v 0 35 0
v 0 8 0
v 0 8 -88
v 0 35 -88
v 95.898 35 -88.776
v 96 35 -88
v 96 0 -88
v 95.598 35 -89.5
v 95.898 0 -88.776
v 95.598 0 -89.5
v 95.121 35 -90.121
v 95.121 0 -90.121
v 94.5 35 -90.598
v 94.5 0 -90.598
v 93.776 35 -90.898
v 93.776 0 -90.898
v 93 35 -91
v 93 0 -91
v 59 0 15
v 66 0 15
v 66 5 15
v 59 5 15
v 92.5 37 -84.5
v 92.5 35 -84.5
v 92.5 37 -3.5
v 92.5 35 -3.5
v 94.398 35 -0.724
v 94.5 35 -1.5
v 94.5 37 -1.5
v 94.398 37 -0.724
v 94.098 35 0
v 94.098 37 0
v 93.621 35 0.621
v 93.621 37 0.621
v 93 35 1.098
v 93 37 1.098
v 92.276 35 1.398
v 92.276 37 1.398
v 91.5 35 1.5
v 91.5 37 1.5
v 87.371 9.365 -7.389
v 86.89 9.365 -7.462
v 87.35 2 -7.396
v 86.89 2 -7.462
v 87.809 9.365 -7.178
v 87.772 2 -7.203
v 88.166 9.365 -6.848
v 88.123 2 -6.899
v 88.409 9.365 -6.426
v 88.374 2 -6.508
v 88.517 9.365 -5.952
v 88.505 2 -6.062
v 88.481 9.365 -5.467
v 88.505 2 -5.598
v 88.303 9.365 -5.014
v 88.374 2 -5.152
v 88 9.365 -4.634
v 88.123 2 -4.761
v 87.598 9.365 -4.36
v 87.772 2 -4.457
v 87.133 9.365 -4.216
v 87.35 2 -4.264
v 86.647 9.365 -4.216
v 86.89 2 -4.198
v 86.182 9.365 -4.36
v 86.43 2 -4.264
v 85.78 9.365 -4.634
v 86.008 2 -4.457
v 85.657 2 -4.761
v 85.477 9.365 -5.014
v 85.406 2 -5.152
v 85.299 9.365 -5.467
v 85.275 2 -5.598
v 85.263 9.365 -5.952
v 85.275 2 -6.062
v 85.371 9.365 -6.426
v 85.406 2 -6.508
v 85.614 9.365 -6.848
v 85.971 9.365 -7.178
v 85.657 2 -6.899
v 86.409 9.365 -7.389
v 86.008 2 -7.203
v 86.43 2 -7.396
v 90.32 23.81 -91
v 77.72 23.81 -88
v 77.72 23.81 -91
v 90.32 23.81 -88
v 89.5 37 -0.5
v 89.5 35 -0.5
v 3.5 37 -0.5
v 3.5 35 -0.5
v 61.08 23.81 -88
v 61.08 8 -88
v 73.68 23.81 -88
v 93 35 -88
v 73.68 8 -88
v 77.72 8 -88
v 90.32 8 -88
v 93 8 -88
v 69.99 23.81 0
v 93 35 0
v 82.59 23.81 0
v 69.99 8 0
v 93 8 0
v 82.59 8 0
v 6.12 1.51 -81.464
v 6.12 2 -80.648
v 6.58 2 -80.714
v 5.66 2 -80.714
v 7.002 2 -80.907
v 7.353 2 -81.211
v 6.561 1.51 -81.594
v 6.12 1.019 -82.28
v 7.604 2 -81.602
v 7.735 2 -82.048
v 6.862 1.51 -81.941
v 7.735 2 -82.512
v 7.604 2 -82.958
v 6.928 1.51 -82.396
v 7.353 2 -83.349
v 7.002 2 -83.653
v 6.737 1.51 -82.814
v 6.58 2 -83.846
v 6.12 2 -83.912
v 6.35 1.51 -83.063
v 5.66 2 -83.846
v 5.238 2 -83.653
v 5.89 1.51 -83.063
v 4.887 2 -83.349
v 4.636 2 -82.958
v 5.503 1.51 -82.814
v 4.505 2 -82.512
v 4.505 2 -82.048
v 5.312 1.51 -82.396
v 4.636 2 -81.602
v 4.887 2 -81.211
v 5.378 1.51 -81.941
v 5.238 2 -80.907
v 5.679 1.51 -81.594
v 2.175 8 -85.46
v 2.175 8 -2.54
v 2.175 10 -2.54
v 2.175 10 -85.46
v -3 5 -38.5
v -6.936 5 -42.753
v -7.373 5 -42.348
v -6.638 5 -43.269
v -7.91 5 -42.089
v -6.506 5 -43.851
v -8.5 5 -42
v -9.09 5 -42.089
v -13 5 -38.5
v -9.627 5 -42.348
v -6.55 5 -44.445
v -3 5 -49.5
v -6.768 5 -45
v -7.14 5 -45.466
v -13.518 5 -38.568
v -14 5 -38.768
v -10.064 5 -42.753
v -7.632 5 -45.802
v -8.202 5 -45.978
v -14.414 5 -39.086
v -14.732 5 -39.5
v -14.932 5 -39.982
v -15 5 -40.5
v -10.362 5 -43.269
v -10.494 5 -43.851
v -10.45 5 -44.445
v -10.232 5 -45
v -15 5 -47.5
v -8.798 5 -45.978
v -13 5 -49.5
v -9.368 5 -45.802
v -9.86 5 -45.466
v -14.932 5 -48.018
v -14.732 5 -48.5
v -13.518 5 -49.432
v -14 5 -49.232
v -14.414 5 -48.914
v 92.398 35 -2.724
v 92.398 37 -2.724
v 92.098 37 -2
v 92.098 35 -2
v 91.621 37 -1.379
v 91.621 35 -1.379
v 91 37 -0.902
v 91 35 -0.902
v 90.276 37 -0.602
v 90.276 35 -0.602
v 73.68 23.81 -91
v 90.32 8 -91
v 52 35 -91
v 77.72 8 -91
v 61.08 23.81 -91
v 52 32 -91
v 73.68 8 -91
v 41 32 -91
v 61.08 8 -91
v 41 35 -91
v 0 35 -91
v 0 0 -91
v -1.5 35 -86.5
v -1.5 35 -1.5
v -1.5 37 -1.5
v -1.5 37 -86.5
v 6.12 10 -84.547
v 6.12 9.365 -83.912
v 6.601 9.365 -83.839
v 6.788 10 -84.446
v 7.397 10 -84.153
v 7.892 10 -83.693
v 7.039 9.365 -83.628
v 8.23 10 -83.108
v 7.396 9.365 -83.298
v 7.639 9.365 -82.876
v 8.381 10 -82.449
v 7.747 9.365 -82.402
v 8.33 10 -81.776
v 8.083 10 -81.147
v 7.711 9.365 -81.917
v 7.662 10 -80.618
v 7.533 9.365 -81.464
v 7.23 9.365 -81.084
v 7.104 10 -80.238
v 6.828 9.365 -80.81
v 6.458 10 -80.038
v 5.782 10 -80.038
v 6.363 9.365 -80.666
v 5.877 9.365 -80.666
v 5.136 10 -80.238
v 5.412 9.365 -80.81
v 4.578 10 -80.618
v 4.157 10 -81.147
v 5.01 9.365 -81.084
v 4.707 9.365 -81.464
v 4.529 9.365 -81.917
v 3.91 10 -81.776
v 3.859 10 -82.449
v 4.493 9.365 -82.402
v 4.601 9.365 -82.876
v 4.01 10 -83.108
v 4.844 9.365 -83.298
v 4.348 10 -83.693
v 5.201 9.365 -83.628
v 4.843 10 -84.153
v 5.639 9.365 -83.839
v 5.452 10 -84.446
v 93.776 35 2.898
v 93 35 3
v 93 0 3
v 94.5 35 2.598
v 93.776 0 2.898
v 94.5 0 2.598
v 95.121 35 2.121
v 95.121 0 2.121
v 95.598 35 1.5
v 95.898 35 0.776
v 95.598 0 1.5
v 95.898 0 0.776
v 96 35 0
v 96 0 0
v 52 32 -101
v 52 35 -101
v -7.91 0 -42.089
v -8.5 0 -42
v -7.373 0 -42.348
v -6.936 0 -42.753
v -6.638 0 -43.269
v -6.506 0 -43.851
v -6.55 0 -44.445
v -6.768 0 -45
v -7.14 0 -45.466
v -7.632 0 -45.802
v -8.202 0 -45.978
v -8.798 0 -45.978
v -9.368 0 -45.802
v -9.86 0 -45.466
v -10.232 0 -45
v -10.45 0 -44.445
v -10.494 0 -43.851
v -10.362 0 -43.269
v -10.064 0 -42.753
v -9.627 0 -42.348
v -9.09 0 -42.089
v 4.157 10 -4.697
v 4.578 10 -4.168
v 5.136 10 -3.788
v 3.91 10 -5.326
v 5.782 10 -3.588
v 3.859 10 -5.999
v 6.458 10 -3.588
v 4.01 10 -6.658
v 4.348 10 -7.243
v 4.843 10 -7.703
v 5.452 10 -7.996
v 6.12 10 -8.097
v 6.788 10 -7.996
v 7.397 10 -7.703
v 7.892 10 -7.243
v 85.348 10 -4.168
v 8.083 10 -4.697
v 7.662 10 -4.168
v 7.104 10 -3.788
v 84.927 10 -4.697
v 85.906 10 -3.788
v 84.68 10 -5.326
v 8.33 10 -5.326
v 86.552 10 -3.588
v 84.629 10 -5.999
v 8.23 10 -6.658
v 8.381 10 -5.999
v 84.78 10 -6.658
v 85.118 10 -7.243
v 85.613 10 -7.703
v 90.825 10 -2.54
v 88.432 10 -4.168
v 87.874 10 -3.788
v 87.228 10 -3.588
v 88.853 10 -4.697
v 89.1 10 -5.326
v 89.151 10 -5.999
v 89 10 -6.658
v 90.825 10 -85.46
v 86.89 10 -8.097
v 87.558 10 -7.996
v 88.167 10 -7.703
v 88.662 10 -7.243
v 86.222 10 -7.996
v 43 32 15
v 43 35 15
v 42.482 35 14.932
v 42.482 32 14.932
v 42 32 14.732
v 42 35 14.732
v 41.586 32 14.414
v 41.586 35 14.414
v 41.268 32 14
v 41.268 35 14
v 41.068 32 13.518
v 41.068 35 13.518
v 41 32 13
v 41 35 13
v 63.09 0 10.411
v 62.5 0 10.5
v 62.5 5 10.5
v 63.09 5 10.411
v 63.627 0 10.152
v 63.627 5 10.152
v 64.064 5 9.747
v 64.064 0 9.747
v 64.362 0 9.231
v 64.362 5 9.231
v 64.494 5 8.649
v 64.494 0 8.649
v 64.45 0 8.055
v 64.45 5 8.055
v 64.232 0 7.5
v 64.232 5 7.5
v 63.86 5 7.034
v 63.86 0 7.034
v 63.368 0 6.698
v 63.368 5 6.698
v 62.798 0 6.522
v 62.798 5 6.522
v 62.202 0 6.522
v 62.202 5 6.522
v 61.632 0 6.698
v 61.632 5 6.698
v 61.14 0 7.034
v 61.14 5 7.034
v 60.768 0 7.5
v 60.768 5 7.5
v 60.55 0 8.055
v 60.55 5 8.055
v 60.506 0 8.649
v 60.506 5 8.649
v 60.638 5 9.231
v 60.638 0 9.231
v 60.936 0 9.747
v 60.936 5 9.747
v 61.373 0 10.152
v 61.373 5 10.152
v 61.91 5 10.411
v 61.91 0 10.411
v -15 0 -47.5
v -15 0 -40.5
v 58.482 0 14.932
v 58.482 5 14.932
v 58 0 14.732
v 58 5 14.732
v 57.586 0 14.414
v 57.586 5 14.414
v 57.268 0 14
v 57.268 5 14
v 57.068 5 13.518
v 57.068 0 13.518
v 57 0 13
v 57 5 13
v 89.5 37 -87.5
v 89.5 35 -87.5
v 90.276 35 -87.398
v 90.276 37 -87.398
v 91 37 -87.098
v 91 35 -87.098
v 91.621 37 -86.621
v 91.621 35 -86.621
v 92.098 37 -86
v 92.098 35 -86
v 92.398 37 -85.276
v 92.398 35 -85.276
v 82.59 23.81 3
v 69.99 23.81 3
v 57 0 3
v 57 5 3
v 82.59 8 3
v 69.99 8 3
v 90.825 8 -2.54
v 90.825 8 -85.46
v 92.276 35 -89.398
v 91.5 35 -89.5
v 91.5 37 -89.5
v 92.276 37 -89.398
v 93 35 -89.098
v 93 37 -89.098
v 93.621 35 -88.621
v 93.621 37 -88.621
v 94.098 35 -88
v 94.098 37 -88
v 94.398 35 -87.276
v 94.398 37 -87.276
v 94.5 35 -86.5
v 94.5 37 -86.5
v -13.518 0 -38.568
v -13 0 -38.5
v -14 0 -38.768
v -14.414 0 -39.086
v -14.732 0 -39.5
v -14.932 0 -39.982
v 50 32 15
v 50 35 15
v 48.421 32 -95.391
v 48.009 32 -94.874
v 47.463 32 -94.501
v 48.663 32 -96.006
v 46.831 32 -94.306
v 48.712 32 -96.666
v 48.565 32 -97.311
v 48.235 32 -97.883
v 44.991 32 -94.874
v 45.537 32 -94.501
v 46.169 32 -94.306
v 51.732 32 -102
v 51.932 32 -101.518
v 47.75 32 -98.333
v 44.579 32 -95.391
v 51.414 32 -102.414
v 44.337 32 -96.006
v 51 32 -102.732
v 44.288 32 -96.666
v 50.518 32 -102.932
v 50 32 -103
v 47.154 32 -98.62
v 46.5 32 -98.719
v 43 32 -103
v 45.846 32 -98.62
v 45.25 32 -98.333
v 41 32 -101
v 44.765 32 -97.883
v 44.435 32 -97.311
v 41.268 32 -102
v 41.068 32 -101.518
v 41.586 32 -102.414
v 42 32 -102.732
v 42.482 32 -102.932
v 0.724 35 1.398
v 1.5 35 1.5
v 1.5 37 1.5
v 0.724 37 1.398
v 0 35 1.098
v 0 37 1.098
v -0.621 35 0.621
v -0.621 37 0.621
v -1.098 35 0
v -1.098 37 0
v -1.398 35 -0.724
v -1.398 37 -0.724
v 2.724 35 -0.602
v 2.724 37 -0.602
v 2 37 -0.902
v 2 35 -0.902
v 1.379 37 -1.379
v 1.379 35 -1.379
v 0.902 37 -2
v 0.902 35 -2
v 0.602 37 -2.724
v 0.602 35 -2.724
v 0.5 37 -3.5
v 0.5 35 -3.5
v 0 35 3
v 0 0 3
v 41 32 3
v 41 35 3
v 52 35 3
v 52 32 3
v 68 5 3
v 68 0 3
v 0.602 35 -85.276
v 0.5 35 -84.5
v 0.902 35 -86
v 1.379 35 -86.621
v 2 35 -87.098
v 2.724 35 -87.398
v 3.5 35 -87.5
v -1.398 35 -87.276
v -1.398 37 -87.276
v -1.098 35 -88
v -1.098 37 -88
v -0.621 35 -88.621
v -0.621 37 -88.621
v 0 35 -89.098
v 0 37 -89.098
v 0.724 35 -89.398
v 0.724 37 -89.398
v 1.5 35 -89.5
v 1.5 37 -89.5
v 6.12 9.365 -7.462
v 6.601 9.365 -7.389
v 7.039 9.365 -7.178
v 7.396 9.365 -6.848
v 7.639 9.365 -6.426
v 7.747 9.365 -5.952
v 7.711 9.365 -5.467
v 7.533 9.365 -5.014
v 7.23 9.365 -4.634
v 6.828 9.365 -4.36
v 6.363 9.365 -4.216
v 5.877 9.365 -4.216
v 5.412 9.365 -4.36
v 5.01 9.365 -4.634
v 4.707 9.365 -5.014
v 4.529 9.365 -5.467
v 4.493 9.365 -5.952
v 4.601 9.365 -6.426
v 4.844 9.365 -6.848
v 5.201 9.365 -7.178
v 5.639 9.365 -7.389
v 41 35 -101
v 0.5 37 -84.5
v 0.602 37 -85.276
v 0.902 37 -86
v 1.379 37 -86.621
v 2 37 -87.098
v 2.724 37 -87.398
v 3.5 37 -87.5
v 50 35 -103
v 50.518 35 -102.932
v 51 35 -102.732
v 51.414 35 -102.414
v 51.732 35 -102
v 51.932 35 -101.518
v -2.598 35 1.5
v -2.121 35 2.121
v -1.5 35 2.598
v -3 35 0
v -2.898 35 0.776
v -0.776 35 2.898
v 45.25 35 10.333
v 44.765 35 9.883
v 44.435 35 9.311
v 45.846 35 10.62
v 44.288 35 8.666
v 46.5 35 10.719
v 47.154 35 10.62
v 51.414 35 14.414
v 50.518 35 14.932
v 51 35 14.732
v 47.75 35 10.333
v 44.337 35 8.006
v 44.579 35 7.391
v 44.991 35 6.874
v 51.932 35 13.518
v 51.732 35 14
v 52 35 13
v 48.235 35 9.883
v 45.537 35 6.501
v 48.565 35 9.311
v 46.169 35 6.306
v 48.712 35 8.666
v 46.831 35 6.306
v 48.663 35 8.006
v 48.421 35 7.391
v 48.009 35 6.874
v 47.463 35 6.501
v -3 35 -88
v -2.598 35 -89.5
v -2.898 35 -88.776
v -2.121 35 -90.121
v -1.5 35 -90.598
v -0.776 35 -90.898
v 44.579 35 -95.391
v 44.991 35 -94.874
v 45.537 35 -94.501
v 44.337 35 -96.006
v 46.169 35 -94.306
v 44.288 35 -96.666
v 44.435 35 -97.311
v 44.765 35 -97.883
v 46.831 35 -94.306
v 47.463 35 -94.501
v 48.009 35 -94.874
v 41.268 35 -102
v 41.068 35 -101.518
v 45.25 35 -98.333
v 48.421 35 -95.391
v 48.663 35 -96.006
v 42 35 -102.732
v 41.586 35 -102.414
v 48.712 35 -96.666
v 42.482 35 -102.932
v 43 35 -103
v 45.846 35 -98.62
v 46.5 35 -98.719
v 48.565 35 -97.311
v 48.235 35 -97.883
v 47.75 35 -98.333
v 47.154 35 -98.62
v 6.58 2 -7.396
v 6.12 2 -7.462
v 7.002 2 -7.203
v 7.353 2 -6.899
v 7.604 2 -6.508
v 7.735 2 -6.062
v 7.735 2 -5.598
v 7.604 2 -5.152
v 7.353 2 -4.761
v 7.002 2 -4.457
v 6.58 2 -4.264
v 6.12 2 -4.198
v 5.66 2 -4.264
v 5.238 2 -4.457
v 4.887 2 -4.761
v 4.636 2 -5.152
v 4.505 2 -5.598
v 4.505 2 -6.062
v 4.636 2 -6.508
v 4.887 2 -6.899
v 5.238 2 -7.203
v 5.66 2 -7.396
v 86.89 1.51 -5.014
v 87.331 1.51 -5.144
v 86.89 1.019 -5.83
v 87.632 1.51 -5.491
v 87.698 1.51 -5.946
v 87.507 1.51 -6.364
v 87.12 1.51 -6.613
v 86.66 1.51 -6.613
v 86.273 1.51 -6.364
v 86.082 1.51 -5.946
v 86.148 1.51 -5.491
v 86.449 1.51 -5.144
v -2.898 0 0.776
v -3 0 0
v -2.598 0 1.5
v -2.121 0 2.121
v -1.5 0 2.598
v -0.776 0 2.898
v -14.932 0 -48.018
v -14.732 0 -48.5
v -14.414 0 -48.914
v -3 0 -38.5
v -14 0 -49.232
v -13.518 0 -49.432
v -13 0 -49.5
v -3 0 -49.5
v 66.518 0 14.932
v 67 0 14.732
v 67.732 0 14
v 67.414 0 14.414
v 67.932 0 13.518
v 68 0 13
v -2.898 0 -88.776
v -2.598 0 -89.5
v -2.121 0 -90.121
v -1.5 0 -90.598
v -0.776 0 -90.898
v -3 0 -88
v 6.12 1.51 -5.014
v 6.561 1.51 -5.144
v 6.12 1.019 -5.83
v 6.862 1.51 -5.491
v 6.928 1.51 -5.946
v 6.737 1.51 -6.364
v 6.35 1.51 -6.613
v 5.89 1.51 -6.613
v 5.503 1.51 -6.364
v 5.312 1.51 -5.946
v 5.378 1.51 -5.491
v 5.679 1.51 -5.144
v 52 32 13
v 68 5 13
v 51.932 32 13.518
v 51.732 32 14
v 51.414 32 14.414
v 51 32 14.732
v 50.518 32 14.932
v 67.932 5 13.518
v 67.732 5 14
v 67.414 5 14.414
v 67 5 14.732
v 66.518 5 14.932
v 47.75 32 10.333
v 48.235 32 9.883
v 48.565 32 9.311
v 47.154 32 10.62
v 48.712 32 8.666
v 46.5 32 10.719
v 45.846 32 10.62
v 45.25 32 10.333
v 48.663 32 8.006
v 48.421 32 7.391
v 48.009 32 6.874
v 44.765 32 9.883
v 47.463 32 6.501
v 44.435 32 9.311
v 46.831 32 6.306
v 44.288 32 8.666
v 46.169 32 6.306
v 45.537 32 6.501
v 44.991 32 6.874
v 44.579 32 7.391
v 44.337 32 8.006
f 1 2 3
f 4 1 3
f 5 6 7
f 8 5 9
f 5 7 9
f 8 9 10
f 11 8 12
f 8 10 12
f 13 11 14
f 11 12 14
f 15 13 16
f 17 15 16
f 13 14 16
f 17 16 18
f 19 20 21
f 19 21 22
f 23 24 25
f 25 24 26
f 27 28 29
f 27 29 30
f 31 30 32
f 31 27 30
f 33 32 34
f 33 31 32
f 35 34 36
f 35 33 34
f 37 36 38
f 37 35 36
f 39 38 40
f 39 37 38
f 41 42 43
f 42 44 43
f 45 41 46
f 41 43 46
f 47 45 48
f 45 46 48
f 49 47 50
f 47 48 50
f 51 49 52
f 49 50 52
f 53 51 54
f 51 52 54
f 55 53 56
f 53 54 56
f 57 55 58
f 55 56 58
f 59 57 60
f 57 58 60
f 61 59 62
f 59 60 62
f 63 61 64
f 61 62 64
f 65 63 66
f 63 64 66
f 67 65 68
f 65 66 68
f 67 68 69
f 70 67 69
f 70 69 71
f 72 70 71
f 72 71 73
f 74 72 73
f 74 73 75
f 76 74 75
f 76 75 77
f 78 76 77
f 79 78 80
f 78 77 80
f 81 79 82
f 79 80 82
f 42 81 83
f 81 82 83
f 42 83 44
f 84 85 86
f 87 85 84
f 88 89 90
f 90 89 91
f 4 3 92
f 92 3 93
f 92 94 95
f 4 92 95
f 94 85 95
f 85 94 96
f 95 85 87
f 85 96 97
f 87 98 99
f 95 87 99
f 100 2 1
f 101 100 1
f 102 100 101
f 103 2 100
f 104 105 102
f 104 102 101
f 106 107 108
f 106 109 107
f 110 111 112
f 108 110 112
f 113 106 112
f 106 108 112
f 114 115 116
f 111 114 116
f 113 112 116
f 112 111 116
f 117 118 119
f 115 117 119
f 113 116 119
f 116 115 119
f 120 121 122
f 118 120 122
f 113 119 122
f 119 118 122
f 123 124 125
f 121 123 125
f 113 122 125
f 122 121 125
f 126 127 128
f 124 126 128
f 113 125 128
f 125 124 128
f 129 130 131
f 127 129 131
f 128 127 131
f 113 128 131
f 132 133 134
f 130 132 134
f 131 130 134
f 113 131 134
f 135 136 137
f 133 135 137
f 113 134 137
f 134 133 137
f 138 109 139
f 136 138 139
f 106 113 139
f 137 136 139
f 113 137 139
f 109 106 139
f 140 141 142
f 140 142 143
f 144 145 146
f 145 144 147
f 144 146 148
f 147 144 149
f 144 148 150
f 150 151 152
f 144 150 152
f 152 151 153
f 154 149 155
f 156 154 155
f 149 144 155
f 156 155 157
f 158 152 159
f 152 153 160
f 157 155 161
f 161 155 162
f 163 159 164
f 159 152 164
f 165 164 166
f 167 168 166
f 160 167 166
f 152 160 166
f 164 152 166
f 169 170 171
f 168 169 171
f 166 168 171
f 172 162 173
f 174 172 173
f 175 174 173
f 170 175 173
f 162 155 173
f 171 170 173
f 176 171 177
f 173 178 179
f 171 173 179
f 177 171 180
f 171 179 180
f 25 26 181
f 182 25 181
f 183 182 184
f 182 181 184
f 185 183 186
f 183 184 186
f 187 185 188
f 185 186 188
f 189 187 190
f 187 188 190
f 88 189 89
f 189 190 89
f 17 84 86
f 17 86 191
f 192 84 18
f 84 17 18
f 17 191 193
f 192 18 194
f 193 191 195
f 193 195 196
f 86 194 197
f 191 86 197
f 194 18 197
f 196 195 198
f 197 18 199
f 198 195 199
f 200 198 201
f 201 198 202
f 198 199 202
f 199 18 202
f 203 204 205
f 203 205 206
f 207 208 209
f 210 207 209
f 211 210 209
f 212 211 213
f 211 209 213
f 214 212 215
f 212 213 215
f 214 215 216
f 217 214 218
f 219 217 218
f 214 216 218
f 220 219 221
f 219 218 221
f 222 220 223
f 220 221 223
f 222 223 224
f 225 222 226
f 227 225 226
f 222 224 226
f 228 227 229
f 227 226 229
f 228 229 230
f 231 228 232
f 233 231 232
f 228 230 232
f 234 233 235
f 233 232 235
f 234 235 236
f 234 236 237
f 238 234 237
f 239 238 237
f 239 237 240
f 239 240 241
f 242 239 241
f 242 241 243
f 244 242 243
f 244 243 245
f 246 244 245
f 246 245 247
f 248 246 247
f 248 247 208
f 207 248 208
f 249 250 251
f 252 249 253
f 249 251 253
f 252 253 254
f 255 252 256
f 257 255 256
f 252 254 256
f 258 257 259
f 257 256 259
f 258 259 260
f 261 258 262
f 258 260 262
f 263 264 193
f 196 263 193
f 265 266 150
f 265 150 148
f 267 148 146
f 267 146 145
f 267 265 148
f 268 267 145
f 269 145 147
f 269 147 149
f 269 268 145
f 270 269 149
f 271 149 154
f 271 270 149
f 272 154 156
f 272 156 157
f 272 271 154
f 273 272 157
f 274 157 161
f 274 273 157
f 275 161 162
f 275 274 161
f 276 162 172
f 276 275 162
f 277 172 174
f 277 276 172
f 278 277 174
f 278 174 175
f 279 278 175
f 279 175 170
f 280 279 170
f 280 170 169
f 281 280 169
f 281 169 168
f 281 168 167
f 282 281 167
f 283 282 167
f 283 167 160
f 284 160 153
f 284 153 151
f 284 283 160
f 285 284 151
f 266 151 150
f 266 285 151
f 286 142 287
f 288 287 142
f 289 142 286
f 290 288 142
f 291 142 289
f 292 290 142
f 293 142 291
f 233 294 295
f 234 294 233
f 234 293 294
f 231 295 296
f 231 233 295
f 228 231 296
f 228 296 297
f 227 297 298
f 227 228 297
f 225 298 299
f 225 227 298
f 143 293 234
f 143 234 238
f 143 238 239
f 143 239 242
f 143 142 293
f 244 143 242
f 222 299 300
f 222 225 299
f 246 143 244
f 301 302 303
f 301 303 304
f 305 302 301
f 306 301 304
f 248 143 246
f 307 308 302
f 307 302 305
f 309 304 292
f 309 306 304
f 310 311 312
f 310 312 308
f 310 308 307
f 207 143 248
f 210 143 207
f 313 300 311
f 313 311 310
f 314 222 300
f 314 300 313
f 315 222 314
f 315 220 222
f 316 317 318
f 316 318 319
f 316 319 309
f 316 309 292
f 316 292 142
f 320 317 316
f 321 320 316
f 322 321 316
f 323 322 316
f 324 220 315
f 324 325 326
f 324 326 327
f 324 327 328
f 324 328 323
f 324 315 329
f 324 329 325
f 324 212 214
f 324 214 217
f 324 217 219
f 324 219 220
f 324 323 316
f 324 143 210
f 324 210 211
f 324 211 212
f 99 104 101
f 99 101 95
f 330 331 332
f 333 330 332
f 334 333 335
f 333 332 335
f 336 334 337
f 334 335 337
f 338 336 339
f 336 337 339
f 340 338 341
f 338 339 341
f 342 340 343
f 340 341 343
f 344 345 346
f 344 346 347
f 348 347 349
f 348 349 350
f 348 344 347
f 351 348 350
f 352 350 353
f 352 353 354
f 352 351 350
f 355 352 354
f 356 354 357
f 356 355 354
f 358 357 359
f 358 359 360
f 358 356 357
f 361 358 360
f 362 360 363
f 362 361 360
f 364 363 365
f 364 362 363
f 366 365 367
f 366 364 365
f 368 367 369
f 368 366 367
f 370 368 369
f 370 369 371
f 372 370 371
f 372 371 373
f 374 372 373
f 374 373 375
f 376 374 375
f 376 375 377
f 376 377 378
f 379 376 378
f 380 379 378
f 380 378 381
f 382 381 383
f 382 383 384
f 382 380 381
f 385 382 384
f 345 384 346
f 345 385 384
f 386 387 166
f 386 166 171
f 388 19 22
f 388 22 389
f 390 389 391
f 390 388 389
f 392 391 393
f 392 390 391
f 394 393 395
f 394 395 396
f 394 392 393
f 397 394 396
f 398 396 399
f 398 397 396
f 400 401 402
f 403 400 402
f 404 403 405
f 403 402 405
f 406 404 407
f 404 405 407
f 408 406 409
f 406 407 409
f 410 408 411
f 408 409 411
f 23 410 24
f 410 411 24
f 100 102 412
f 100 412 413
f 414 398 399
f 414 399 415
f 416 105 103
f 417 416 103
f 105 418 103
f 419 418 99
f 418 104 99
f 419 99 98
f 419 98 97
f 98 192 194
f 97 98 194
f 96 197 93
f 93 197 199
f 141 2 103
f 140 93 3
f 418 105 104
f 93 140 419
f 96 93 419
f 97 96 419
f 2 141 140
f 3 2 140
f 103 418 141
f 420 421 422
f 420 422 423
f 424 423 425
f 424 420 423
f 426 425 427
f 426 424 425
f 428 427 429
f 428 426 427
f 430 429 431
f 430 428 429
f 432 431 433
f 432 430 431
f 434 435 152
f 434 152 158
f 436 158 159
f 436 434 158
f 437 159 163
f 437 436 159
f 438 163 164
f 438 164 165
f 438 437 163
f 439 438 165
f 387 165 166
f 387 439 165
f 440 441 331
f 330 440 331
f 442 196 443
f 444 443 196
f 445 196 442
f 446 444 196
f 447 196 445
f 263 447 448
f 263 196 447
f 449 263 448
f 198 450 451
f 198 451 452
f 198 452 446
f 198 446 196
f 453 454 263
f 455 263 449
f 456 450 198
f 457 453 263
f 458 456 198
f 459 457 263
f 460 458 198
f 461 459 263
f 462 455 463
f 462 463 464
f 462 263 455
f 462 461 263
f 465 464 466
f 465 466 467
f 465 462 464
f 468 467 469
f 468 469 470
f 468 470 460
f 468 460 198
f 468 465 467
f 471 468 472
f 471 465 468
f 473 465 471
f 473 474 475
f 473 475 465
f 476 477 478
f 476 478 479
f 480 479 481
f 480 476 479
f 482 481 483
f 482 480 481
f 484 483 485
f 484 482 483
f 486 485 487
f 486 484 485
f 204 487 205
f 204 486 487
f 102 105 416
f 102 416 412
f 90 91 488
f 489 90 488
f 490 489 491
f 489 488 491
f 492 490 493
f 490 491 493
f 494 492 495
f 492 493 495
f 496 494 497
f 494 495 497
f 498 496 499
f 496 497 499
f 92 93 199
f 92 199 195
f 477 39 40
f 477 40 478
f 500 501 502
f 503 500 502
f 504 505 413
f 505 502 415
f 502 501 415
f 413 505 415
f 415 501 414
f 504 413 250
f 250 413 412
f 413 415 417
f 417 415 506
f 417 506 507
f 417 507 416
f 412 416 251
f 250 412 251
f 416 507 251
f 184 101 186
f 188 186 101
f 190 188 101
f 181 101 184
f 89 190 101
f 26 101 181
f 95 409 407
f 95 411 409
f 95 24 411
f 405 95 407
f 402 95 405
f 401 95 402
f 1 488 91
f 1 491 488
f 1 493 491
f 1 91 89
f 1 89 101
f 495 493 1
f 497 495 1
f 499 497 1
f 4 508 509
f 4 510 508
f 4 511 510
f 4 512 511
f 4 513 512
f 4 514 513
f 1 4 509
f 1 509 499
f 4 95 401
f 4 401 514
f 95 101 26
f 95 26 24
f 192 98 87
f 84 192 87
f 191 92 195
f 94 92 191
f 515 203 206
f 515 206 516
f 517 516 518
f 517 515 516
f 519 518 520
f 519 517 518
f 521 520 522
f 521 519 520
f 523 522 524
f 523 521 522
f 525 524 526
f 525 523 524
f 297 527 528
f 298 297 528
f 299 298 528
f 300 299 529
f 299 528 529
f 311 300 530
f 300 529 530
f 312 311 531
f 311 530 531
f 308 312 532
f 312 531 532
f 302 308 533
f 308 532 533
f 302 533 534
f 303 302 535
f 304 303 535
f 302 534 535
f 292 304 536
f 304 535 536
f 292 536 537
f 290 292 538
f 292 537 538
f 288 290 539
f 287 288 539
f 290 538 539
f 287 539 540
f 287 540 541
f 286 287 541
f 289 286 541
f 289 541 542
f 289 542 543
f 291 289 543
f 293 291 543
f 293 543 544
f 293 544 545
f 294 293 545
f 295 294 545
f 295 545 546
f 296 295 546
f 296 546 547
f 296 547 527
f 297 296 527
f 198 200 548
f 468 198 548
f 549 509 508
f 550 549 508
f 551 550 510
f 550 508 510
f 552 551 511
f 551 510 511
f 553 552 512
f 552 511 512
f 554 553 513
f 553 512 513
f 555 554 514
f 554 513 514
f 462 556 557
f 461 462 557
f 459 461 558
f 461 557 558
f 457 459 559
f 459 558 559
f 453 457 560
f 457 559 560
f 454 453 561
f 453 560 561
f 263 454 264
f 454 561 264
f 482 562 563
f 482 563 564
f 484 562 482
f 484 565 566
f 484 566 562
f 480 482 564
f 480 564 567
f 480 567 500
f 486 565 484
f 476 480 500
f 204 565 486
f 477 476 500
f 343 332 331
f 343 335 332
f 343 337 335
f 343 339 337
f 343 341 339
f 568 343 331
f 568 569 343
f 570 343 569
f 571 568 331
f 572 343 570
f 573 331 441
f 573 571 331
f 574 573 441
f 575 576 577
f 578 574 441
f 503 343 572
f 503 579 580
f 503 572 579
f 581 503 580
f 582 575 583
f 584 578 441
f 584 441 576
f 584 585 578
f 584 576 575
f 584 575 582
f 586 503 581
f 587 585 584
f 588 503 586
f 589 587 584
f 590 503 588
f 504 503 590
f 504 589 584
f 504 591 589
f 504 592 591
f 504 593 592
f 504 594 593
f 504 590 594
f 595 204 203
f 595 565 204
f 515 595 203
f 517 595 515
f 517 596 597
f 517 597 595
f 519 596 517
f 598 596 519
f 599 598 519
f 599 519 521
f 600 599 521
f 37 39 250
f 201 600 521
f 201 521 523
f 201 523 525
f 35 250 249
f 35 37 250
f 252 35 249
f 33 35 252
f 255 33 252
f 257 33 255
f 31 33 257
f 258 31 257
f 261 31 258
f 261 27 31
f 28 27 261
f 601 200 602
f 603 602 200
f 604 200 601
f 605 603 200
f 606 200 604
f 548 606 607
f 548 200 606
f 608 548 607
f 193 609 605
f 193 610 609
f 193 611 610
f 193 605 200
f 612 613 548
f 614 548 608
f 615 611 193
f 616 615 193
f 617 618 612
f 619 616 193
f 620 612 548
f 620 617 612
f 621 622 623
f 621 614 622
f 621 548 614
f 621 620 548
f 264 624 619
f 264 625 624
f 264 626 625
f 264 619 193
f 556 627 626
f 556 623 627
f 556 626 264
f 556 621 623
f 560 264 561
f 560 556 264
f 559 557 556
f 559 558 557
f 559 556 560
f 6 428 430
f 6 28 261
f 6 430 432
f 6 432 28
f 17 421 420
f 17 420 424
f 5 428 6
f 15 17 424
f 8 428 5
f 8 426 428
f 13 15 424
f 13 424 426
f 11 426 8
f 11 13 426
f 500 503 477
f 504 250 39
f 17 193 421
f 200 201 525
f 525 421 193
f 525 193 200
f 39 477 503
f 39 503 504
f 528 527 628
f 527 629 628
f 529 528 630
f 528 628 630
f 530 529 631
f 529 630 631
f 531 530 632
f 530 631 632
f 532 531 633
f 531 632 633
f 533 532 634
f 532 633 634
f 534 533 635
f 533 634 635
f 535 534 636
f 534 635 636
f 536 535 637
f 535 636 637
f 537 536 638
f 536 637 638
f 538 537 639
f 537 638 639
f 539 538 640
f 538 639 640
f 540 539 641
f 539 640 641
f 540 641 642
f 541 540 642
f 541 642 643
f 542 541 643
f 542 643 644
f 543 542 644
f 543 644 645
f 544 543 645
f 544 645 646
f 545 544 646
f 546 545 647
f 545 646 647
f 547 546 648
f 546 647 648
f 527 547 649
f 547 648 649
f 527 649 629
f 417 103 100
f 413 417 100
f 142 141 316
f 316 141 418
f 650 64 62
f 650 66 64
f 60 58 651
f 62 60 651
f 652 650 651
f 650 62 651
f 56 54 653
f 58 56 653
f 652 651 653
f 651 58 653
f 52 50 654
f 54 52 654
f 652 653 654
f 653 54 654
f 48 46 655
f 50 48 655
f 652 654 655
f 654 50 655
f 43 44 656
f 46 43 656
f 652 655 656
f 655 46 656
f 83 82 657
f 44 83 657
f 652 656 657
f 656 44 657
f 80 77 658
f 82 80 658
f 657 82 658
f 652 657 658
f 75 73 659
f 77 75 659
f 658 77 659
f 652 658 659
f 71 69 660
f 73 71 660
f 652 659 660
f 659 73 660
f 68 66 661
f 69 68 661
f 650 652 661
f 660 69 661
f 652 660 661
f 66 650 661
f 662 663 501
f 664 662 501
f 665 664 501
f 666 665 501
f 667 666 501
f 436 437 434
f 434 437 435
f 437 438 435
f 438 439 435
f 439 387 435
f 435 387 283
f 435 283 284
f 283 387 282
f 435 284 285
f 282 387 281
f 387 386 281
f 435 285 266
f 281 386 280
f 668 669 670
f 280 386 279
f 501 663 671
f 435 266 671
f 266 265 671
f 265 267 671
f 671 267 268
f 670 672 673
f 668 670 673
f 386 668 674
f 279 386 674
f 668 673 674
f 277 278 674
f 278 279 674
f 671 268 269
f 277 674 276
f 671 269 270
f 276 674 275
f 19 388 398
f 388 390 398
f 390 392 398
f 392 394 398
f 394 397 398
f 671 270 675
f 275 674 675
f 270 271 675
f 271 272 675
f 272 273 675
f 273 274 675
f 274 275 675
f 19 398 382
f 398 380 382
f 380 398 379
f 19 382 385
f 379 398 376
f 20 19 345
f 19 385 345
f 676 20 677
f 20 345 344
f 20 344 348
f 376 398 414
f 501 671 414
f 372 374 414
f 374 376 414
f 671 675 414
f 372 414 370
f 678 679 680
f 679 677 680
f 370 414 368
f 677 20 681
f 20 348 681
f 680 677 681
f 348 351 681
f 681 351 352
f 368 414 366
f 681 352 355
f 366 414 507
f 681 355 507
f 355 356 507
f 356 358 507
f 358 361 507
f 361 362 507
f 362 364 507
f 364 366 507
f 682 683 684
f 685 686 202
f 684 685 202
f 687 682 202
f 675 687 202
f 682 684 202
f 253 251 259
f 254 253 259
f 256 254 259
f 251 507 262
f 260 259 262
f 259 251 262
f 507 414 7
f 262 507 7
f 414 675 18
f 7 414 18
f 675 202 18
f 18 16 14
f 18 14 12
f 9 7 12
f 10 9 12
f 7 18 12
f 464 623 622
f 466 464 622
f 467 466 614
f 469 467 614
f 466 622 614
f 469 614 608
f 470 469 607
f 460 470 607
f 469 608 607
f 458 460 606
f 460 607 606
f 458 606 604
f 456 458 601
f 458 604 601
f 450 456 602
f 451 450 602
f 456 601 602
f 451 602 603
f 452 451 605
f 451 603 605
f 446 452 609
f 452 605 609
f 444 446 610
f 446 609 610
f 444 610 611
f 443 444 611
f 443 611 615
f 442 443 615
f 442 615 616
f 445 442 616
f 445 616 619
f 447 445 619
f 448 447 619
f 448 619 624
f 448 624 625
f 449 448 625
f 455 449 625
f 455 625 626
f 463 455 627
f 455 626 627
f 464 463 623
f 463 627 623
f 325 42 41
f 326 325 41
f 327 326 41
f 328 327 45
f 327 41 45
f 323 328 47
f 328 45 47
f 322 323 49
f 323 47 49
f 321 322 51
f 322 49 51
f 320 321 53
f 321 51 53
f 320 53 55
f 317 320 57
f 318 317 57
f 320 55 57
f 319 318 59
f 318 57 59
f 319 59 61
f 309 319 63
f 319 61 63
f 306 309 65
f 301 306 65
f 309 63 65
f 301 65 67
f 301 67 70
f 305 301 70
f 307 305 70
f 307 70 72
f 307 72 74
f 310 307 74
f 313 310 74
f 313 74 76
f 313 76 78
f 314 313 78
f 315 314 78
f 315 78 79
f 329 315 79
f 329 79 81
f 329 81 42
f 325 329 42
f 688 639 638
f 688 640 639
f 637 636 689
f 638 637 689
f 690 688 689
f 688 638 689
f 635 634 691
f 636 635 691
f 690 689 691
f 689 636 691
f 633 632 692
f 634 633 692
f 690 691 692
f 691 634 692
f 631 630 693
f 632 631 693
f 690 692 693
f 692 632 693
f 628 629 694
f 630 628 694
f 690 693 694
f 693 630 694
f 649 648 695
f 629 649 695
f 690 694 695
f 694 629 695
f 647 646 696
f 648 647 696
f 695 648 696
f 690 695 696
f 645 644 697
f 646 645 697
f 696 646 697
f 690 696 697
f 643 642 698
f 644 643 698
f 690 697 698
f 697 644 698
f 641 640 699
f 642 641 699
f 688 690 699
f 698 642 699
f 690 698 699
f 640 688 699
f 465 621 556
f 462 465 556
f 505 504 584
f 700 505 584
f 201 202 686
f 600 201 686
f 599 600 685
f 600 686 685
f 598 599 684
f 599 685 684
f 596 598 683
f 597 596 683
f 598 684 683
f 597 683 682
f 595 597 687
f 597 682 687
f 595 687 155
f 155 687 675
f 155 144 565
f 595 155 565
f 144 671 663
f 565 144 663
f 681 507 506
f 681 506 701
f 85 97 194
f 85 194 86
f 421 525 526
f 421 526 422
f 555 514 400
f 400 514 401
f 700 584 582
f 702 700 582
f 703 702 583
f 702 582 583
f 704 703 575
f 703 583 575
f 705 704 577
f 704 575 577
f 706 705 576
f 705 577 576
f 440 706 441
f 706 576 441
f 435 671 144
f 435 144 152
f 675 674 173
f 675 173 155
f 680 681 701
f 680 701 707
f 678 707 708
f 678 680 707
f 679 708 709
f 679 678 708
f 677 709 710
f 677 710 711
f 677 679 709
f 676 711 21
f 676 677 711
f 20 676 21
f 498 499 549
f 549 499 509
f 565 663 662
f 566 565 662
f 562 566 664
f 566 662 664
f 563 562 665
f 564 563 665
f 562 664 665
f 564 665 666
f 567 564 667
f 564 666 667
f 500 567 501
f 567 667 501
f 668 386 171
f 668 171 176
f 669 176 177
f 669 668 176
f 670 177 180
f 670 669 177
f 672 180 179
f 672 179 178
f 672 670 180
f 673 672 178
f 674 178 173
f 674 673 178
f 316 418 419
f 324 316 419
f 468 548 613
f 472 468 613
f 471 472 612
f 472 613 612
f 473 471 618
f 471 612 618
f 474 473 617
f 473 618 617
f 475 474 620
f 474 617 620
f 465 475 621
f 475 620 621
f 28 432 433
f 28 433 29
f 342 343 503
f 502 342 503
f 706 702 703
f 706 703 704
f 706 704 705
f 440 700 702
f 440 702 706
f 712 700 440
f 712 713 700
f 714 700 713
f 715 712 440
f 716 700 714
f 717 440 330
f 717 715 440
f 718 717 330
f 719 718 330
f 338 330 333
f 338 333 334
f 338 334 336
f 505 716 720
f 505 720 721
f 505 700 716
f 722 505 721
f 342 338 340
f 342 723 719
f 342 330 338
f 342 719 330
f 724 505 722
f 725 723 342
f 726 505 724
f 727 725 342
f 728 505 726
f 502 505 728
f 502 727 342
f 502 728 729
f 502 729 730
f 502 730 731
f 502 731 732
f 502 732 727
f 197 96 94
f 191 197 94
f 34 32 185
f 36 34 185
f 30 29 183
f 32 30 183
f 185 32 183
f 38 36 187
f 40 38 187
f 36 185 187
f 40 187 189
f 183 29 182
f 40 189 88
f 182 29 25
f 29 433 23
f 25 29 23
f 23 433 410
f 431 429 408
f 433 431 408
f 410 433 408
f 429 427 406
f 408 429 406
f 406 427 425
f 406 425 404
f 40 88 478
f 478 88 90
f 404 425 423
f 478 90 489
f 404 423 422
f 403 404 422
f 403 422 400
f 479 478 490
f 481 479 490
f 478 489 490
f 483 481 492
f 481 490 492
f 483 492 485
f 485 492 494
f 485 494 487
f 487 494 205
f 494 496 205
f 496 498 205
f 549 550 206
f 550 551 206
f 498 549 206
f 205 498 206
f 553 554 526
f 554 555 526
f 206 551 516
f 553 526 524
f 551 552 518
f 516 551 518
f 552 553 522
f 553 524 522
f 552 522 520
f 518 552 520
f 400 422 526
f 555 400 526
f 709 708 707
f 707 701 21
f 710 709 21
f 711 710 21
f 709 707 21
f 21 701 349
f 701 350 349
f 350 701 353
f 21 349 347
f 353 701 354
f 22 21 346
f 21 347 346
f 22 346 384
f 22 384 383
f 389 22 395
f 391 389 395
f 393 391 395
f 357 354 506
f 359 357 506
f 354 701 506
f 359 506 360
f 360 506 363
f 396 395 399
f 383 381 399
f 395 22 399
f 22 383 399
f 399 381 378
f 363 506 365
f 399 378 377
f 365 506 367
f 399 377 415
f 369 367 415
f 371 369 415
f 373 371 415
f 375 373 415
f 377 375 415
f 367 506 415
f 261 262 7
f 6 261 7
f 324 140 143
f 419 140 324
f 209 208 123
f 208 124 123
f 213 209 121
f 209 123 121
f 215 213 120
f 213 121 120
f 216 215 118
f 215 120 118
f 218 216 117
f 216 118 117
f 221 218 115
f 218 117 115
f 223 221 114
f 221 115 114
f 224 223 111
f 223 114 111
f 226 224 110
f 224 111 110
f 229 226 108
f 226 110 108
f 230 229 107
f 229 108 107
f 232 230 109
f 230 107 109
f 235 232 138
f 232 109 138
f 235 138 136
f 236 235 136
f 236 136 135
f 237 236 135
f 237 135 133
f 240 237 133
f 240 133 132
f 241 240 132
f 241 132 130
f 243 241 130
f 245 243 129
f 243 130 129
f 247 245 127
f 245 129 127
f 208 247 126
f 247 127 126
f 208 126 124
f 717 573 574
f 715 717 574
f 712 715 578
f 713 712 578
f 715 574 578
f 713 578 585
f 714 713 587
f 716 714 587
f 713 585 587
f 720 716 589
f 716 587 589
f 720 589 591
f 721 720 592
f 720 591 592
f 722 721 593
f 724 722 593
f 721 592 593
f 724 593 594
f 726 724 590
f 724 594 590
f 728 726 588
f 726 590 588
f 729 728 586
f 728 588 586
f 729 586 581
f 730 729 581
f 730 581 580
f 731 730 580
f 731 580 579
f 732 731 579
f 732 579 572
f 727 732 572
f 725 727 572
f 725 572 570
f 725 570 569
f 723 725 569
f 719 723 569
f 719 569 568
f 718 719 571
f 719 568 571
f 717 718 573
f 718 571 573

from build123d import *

# Parameters (mm, degrees)
ESBO_O1_W                        = 93
ESBO_O1_H                        = 88
RESSALTO_EXTRUS_O2_DEPTH         = 35
ESBO_O1_5_W                      = 93
ESBO_O1_5_H                      = 88
RESSALTO_EXTRUS_O3_DEPTH         = 8
ESBO_O1_7_R                      = 2
RESSALTO_EXTRUS_O6_DEPTH         = 5
ESBO_O4_R                        = 2.218632056
RESSALTO_EXTRUS_O7_DEPTH         = 3
ESBO_O5_W                        = 88.65
ESBO_O5_H                        = 82.92
RESSALTO_EXTRUS_O8_DEPTH         = 2
ESBO_O7_W                        = 12.6
ESBO_O7_H                        = 15.81
CORTE_EXTRUS_O1_DEPTH            = 146.086181285
ESBO_O8_W                        = 12.6
ESBO_O8_H                        = 15.81
CORTE_EXTRUS_O2_DEPTH            = 146.086181285
FURO_COM_FOLGA_DE_41_D           = 3.2639
FURO_COM_FOLGA_DE_41_DEPTH       = 8
FURO_COM_FOLGA_DE_41_CSINK_D     = 4.5339
FURO_COM_FOLGA_DE_41_CSINK_ANGLE = 90
FURO_COM_FOLGA_DE_41_TIP         = 0.980574487
RESSALTO_EXTRUS_O10_DEPTH        = 2


with BuildPart() as part:
    # Esboço1 → Ressalto-extrusão2 (new body)
    with BuildSketch(Plane(origin=(0, 0, 0), x_dir=(1, 0, 0), z_dir=(0, 1, 0))):
        with BuildLine():
            ThreePointArc((-3, 0), (-2.121320344, -2.121320344), (0, -3))
            Line((0, -3), (57, -3))
            Line((57, -3), (68, -3))
            Line((68, -3), (93, -3))
            ThreePointArc((93, -3), (95.121320344, -2.121320344), (96, 0))
            Line((96, 0), (96, 88))
            ThreePointArc((96, 88), (95.121320344, 90.121320344), (93, 91))
            Line((93, 91), (0, 91))
            ThreePointArc((0, 91), (-2.121320344, 90.121320344), (-3, 88))
            Line((-3, 88), (-3, 49.5))
            Line((-3, 49.5), (-3, 38.5))
            Line((-3, 38.5), (-3, 0))
        make_face()
        with Locations((46.5, 44)):
            Rectangle(ESBO_O1_W, ESBO_O1_H, mode=Mode.SUBTRACT)
    extrude(amount=RESSALTO_EXTRUS_O2_DEPTH)

    # Esboço1<5> → Ressalto-extrusão3 (add)
    with BuildSketch(Plane(origin=(0, 0, 0), x_dir=(1, 0, 0), z_dir=(0, 1, 0))):
        with Locations((46.5, 44)):
            Rectangle(ESBO_O1_5_W, ESBO_O1_5_H)
    extrude(amount=RESSALTO_EXTRUS_O3_DEPTH)

    # Esboço1<7> → Ressalto-extrusão6 (add)
    # profile 1 of 2: a face of its own
    with BuildSketch(Plane(origin=(0, 0, 0), x_dir=(1, 0, 0), z_dir=(0, 1, 0))):
        with BuildLine():
            Line((68, -3), (57, -3))
            Line((57, -3), (57, -13))
            ThreePointArc((57, -13), (57.585786438, -14.414213562), (59, -15))
            Line((59, -15), (66, -15))
            ThreePointArc((66, -15), (67.414213562, -14.414213562), (68, -13))
            Line((68, -13), (68, -3))
        make_face()
        with Locations((62.5, -8.5)):
            Circle(ESBO_O1_7_R, mode=Mode.SUBTRACT)
    # profile 2 of 2: a face of its own
    with BuildSketch(Plane(origin=(0, 0, 0), x_dir=(1, 0, 0), z_dir=(0, 1, 0))):
        with BuildLine():
            Line((-13, 38.5), (-3, 38.5))
            Line((-3, 38.5), (-3, 49.5))
            Line((-3, 49.5), (-13, 49.5))
            ThreePointArc((-13, 49.5), (-14.414213562, 48.914213562), (-15, 47.5))
            Line((-15, 47.5), (-15, 40.5))
            ThreePointArc((-15, 40.5), (-14.414213562, 39.085786438), (-13, 38.5))
        make_face()
        with Locations((-8.5, 44)):
            Circle(ESBO_O1_7_R, mode=Mode.SUBTRACT)
    extrude(amount=RESSALTO_EXTRUS_O6_DEPTH)

    # Esboço4 → Ressalto-extrusão7 (add)
    # profile 1 of 2: a face of its own
    with BuildSketch(Plane(origin=(0, 35, 0), x_dir=(1, 0, 0), z_dir=(0, 1, 0))):
        with BuildLine():
            Line((41, -3), (52, -3))
            Line((52, -3), (52, -13))
            ThreePointArc((52, -13), (51.414213562, -14.414213562), (50, -15))
            Line((50, -15), (43, -15))
            ThreePointArc((43, -15), (41.585786438, -14.414213562), (41, -13))
            Line((41, -13), (41, -3))
        make_face()
        with Locations((46.5, -8.5)):
            Circle(ESBO_O4_R, mode=Mode.SUBTRACT)
    # profile 2 of 2: a face of its own
    with BuildSketch(Plane(origin=(0, 35, 0), x_dir=(1, 0, 0), z_dir=(0, 1, 0))):
        with BuildLine():
            Line((43, 103), (50, 103))
            ThreePointArc((50, 103), (51.414213562, 102.414213562), (52, 101))
            Line((52, 101), (52, 91))
            Line((52, 91), (41, 91))
            Line((41, 91), (41, 101))
            ThreePointArc((41, 101), (41.585786438, 102.414213562), (43, 103))
        make_face()
        with Locations((46.5, 96.5)):
            Circle(ESBO_O4_R, mode=Mode.SUBTRACT)
    extrude(amount=-RESSALTO_EXTRUS_O7_DEPTH)

    # Esboço5 → Ressalto-extrusão8 (add)
    with BuildSketch(Plane(origin=(0, 8, 0), x_dir=(1, 0, 0), z_dir=(0, 1, 0))):
        with Locations((46.5, 44)):
            Rectangle(ESBO_O5_W, ESBO_O5_H)
    extrude(amount=RESSALTO_EXTRUS_O8_DEPTH)

    # Esboço7 → Corte-extrusão1 (cut, through all)
    with BuildSketch(Plane.XY.offset(-88)):
        with Locations((67.38, 15.905)):
            Rectangle(ESBO_O7_W, ESBO_O7_H)
        with Locations((84.02, 15.905)):
            Rectangle(ESBO_O7_W, ESBO_O7_H)
    extrude(amount=-CORTE_EXTRUS_O1_DEPTH, mode=Mode.SUBTRACT)

    # Esboço8 → Corte-extrusão2 (cut, through all)
    with BuildSketch(Plane(origin=(0, 0, 0), x_dir=(-1, 0, 0), z_dir=(0, 0, -1))):
        with Locations((-76.29, 15.905)):
            Rectangle(ESBO_O8_W, ESBO_O8_H)
    extrude(amount=-CORTE_EXTRUS_O2_DEPTH, mode=Mode.SUBTRACT)

    # Furo com folga de #41
    with Locations(Plane(origin=(6.12, 10, -82.28), x_dir=(0, 0, 1), z_dir=(0, 1, 0))):
        with Locations((0, 0), (76.45, 0), (76.45, 80.77)):
            CounterSinkHole(FURO_COM_FOLGA_DE_41_D / 2, FURO_COM_FOLGA_DE_41_CSINK_D / 2, depth=FURO_COM_FOLGA_DE_41_DEPTH, counter_sink_angle=FURO_COM_FOLGA_DE_41_CSINK_ANGLE)
            with Locations((0, 0, -(FURO_COM_FOLGA_DE_41_DEPTH + FURO_COM_FOLGA_DE_41_TIP / 2))):  # 118° drill point
                Cone(0, FURO_COM_FOLGA_DE_41_D / 2, FURO_COM_FOLGA_DE_41_TIP, mode=Mode.SUBTRACT)

    # Esboço14 → Ressalto-extrusão10 (add)
    with BuildSketch(Plane(origin=(0, 35, 0), x_dir=(1, 0, 0), z_dir=(0, 1, 0))):
        with BuildLine():
            Line((1.5, 89.5), (91.5, 89.5))
            ThreePointArc((91.5, 89.5), (93.621320344, 88.621320344), (94.5, 86.5))
            Line((94.5, 86.5), (94.5, 1.5))
            ThreePointArc((94.5, 1.5), (93.621320344, -0.621320344), (91.5, -1.5))
            Line((91.5, -1.5), (1.5, -1.5))
            ThreePointArc((1.5, -1.5), (-0.621320344, -0.621320344), (-1.5, 1.5))
            Line((-1.5, 1.5), (-1.5, 86.5))
            ThreePointArc((-1.5, 86.5), (-0.621320344, 88.621320344), (1.5, 89.5))
        make_face()
        with BuildLine():
            Line((3.5, 87.5), (89.5, 87.5))
            ThreePointArc((89.5, 87.5), (91.621320344, 86.621320344), (92.5, 84.5))
            Line((92.5, 84.5), (92.5, 3.5))
            ThreePointArc((92.5, 3.5), (91.621320344, 1.378679656), (89.5, 0.5))
            Line((89.5, 0.5), (3.5, 0.5))
            ThreePointArc((3.5, 0.5), (1.378679656, 1.378679656), (0.5, 3.5))
            Line((0.5, 3.5), (0.5, 84.5))
            ThreePointArc((0.5, 84.5), (1.378679656, 86.621320344), (3.5, 87.5))
        make_face(mode=Mode.SUBTRACT)
    extrude(amount=RESSALTO_EXTRUS_O10_DEPTH)


solid = part.part
